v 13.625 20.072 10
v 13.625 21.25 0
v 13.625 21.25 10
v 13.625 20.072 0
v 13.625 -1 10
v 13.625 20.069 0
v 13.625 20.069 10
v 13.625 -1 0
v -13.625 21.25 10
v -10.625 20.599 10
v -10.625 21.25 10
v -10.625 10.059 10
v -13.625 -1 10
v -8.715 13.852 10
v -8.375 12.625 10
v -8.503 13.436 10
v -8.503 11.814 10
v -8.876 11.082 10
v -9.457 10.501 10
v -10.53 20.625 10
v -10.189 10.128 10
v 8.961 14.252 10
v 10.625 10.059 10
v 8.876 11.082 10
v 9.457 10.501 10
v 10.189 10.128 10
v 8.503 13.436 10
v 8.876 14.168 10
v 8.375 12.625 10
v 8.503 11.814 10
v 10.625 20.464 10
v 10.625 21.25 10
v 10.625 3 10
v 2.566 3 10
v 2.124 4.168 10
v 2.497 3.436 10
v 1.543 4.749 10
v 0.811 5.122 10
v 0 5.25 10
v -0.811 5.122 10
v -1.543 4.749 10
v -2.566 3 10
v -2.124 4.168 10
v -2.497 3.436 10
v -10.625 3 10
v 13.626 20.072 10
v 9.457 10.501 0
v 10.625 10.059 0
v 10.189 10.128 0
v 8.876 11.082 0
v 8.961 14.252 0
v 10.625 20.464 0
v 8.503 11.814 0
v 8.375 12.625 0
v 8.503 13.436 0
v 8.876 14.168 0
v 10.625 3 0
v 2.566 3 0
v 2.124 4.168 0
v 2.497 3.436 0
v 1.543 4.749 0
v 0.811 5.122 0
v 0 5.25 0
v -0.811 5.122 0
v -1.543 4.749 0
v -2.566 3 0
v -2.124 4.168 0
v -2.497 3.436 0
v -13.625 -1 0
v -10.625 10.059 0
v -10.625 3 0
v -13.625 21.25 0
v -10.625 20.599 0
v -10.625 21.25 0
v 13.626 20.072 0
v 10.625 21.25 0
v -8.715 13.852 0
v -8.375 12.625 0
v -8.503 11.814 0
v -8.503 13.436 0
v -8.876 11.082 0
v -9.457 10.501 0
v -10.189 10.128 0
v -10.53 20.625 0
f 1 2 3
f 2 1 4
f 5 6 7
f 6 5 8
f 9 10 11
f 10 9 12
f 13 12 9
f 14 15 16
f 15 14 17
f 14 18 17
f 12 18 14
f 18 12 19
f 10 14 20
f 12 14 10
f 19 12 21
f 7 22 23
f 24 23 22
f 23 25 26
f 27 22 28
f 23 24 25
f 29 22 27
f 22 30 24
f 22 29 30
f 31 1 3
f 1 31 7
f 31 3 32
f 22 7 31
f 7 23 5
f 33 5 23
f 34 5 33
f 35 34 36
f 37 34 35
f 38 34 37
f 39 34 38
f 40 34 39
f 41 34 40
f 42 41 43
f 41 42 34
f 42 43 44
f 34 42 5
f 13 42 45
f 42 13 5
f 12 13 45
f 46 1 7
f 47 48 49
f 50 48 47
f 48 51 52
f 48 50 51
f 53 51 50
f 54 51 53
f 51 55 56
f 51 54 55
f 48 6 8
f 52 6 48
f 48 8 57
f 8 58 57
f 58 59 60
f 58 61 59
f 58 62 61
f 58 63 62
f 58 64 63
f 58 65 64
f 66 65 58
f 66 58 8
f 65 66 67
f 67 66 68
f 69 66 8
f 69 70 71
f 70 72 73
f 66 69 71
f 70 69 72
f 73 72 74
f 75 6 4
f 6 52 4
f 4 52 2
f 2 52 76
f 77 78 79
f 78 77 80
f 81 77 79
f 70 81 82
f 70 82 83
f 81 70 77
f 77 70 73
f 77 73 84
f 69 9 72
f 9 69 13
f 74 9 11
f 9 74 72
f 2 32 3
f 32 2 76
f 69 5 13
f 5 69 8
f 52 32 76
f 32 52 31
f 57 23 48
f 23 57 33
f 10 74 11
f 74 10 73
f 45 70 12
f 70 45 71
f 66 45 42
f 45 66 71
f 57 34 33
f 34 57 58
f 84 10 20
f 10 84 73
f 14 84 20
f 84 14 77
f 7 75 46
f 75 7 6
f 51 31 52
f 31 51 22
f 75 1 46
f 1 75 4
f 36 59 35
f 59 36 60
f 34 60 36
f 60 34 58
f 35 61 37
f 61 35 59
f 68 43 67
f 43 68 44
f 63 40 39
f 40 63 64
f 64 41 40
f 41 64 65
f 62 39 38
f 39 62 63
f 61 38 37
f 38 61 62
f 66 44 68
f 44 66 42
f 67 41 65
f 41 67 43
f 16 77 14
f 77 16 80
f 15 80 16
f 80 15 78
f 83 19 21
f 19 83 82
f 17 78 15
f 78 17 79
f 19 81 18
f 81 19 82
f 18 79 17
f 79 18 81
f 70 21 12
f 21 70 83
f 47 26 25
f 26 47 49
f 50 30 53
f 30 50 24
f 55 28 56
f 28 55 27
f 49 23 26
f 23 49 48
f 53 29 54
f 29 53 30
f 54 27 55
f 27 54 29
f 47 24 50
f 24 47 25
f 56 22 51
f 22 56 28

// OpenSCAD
// nischi 
// mendel max clip

breite = 27.25;
tiefe  = 22.25;
hoehe  = 10.00;

dicke1 = 3.0;
dicke2 = 3.6;

misumi = 20.00;    
misumi_hole = 5.25;

// lochtiefe  7.00
// lochbreite 5.25

translate([0,0,0]) rotate([0,0,0]) tool_clip();

module tool_clip()
{
  difference()
  {
    union()
    {
        color("blue") translate([-breite/2,-1,0]) cube([breite,tiefe,hoehe]);  
    }

    union()
    {
       color("blue") translate([-breite/2+dicke1,dicke1,-1]) 
       cube([breite-2*dicke1,tiefe,hoehe*2]);
           // cylinder(20, r=5/2,$fn=20);
    }
  }

  color("lightblue") translate([-breite/2+2.3,misumi/2+2,0]) 
  rotate([0,0,15]) cube([3,tiefe/2-3,hoehe]);  

  color("lightblue") translate([+breite/2-5,misumi/2+3,0]) 
  rotate([0,0,-15]) cube([3,tiefe/2-3,hoehe]);

  color("red")  translate([0,misumi_hole/2,0]) cylinder(hoehe, r=misumi_hole/2,$fn=20);

  color("orange")  translate([-breite/2+misumi_hole/2,misumi_hole/2+misumi/2,0]) 
  cylinder(hoehe, r=misumi_hole/2,$fn=20);
  color("orange")  translate([ breite/2-misumi_hole/2,misumi_hole/2+misumi/2,0]) 
  cylinder(hoehe, r=misumi_hole/2,$fn=20);
}
